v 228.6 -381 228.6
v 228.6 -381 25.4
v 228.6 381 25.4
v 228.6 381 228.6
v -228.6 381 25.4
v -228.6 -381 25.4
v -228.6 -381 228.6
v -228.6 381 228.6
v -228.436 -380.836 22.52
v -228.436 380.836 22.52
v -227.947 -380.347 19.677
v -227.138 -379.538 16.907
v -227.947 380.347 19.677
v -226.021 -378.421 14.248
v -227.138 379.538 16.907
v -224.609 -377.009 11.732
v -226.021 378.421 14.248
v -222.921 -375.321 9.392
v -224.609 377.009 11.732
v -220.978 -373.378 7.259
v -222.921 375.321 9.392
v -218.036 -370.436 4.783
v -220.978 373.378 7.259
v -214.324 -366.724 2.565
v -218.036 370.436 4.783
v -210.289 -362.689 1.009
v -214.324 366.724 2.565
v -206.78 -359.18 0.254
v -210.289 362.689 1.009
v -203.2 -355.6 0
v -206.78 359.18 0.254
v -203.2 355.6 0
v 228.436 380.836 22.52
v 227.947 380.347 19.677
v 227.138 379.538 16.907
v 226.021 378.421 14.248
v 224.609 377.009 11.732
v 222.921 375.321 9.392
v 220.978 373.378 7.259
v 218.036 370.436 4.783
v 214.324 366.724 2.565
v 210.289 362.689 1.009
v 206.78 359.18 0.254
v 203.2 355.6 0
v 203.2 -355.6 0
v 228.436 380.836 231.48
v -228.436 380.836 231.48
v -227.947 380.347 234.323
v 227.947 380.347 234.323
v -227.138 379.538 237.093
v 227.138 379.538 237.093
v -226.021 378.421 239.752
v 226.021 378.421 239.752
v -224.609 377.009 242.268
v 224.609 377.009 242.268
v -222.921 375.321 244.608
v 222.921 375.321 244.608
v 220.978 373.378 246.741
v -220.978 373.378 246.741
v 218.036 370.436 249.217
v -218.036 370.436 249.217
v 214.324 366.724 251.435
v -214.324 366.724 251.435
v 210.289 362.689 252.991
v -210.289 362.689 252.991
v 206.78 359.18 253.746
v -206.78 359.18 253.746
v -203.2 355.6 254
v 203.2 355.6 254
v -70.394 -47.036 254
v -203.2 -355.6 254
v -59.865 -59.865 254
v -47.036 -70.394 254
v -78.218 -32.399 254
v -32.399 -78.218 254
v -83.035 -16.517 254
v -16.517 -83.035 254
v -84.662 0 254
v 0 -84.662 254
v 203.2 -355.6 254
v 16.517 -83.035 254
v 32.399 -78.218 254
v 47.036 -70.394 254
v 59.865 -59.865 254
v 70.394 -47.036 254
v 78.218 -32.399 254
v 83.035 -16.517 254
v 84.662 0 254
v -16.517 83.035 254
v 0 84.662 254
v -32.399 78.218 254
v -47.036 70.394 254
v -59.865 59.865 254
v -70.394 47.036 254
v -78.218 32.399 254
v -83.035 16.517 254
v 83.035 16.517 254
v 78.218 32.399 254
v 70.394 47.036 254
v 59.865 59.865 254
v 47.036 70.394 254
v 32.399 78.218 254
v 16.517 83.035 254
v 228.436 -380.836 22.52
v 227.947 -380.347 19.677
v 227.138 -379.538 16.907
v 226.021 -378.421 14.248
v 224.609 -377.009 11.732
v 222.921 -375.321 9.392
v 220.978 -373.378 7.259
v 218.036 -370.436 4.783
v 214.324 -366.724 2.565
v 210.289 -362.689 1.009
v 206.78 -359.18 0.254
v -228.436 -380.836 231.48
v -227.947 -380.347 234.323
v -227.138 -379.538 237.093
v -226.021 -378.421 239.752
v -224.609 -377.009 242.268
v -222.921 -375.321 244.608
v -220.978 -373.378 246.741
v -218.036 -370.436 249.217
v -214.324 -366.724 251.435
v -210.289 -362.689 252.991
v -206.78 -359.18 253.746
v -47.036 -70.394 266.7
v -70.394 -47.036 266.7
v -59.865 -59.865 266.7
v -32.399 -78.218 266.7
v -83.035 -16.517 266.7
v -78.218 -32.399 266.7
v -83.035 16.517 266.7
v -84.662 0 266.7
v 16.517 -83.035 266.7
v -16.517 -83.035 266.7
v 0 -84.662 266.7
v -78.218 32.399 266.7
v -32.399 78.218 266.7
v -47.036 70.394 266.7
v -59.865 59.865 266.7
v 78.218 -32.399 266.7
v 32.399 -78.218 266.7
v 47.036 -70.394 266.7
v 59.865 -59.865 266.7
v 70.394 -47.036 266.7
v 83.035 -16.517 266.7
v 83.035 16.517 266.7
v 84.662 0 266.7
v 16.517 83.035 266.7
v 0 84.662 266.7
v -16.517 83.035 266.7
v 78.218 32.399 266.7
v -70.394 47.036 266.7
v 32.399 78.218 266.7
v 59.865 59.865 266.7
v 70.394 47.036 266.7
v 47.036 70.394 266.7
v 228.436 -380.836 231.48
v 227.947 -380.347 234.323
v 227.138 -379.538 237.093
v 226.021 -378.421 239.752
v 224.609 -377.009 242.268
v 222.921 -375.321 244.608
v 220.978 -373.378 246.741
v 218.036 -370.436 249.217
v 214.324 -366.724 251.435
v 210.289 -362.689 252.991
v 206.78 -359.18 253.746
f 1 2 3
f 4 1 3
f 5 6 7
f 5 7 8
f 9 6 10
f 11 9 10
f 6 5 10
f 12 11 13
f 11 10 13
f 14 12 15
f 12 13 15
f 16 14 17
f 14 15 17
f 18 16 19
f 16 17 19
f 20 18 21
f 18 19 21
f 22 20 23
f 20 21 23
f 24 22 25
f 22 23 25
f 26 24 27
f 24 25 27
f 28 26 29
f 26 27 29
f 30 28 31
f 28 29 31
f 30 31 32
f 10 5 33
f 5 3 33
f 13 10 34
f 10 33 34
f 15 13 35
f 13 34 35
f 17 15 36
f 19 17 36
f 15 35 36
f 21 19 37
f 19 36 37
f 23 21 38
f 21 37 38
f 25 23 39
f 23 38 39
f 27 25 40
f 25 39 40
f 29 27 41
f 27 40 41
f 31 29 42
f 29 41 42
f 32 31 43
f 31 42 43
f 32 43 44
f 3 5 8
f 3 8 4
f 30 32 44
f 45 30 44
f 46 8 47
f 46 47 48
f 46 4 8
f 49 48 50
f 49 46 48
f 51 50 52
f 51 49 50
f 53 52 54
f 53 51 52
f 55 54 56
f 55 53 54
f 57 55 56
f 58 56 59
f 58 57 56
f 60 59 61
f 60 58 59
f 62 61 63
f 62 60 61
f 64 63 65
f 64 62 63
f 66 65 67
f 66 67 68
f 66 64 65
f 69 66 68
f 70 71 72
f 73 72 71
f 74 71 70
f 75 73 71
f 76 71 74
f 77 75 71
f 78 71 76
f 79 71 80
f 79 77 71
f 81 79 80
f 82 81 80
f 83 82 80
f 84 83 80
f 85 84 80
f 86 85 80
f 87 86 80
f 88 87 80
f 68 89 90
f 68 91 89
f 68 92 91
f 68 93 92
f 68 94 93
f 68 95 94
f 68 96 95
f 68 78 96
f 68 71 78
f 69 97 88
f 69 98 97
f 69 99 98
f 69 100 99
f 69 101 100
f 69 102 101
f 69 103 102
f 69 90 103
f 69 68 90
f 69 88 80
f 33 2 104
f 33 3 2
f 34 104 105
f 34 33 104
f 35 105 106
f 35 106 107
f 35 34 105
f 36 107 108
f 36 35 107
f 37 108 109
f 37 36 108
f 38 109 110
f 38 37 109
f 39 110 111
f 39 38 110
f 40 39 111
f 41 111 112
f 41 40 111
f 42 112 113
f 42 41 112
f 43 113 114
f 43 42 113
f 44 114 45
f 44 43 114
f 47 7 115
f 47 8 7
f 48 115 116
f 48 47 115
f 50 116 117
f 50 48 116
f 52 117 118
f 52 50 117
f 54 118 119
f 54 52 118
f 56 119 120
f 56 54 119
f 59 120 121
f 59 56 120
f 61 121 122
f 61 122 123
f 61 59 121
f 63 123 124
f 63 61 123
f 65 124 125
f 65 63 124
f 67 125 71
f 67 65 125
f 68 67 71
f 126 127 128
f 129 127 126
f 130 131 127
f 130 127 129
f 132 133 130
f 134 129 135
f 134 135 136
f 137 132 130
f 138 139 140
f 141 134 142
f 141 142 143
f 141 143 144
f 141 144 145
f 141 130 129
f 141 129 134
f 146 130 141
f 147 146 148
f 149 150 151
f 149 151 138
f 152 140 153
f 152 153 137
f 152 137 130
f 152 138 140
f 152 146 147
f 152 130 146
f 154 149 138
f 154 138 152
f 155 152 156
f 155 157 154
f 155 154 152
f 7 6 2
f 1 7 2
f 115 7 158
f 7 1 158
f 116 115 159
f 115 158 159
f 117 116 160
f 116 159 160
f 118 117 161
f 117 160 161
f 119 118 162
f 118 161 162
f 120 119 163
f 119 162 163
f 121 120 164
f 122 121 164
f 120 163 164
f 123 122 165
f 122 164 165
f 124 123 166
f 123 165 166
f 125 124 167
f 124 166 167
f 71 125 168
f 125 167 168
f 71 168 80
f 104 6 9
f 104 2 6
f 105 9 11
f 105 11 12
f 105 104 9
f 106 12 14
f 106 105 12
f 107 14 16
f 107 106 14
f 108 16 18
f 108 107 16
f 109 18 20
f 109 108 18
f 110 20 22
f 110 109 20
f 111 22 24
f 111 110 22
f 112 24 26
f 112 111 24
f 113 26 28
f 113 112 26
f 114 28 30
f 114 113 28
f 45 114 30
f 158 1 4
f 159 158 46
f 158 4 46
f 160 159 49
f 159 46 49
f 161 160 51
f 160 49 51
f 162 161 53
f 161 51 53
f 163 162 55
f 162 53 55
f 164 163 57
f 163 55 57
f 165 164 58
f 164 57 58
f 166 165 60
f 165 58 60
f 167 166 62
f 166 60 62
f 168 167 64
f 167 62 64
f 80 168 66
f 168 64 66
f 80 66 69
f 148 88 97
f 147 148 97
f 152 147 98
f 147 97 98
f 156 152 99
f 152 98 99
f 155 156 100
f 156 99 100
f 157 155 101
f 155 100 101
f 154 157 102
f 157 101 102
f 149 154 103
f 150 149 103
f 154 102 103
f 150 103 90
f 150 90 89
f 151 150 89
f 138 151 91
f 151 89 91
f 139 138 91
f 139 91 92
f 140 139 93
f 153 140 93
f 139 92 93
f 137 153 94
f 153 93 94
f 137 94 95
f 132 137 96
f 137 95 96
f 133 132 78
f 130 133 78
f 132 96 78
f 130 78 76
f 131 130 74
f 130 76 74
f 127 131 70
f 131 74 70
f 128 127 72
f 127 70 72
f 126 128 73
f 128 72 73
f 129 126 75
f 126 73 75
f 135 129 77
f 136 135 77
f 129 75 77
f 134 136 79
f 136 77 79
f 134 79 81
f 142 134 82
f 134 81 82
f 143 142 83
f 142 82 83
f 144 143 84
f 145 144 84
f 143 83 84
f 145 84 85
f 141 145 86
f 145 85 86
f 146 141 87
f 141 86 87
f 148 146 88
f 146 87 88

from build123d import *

# Parameters (mm, degrees)
F0_W     = 457.2
F0_H     = 762
F1_DEPTH = 254
F2_R     = 25.4
F3_R     = 84.662074
F4_DEPTH = 12.7


with BuildPart() as f1:
    # F0 (on Top) → F1 (new body)
    with BuildSketch(Plane.XY):
        Rectangle(F0_W, F0_H)
    extrude(amount=F1_DEPTH)

    # F2
    f2_edges = [f1.edges().sort_by_distance(p)[0] for p in [
        (0, 381, 254),
        (228.6, 0, 254),
        (0, -381, 254),
        (-228.6, 0, 254),
        (228.6, 0, 0),
        (-228.6, 0, 0),
        (0, -381, 0),
        (0, 381, 0),
    ]]
    fillet(f2_edges, radius=F2_R)

    # F3 (on face) → F4 (join)
    with BuildSketch(Plane.XY.offset(254)):
        Circle(F3_R)
    extrude(amount=F4_DEPTH)


solid = f1.part
